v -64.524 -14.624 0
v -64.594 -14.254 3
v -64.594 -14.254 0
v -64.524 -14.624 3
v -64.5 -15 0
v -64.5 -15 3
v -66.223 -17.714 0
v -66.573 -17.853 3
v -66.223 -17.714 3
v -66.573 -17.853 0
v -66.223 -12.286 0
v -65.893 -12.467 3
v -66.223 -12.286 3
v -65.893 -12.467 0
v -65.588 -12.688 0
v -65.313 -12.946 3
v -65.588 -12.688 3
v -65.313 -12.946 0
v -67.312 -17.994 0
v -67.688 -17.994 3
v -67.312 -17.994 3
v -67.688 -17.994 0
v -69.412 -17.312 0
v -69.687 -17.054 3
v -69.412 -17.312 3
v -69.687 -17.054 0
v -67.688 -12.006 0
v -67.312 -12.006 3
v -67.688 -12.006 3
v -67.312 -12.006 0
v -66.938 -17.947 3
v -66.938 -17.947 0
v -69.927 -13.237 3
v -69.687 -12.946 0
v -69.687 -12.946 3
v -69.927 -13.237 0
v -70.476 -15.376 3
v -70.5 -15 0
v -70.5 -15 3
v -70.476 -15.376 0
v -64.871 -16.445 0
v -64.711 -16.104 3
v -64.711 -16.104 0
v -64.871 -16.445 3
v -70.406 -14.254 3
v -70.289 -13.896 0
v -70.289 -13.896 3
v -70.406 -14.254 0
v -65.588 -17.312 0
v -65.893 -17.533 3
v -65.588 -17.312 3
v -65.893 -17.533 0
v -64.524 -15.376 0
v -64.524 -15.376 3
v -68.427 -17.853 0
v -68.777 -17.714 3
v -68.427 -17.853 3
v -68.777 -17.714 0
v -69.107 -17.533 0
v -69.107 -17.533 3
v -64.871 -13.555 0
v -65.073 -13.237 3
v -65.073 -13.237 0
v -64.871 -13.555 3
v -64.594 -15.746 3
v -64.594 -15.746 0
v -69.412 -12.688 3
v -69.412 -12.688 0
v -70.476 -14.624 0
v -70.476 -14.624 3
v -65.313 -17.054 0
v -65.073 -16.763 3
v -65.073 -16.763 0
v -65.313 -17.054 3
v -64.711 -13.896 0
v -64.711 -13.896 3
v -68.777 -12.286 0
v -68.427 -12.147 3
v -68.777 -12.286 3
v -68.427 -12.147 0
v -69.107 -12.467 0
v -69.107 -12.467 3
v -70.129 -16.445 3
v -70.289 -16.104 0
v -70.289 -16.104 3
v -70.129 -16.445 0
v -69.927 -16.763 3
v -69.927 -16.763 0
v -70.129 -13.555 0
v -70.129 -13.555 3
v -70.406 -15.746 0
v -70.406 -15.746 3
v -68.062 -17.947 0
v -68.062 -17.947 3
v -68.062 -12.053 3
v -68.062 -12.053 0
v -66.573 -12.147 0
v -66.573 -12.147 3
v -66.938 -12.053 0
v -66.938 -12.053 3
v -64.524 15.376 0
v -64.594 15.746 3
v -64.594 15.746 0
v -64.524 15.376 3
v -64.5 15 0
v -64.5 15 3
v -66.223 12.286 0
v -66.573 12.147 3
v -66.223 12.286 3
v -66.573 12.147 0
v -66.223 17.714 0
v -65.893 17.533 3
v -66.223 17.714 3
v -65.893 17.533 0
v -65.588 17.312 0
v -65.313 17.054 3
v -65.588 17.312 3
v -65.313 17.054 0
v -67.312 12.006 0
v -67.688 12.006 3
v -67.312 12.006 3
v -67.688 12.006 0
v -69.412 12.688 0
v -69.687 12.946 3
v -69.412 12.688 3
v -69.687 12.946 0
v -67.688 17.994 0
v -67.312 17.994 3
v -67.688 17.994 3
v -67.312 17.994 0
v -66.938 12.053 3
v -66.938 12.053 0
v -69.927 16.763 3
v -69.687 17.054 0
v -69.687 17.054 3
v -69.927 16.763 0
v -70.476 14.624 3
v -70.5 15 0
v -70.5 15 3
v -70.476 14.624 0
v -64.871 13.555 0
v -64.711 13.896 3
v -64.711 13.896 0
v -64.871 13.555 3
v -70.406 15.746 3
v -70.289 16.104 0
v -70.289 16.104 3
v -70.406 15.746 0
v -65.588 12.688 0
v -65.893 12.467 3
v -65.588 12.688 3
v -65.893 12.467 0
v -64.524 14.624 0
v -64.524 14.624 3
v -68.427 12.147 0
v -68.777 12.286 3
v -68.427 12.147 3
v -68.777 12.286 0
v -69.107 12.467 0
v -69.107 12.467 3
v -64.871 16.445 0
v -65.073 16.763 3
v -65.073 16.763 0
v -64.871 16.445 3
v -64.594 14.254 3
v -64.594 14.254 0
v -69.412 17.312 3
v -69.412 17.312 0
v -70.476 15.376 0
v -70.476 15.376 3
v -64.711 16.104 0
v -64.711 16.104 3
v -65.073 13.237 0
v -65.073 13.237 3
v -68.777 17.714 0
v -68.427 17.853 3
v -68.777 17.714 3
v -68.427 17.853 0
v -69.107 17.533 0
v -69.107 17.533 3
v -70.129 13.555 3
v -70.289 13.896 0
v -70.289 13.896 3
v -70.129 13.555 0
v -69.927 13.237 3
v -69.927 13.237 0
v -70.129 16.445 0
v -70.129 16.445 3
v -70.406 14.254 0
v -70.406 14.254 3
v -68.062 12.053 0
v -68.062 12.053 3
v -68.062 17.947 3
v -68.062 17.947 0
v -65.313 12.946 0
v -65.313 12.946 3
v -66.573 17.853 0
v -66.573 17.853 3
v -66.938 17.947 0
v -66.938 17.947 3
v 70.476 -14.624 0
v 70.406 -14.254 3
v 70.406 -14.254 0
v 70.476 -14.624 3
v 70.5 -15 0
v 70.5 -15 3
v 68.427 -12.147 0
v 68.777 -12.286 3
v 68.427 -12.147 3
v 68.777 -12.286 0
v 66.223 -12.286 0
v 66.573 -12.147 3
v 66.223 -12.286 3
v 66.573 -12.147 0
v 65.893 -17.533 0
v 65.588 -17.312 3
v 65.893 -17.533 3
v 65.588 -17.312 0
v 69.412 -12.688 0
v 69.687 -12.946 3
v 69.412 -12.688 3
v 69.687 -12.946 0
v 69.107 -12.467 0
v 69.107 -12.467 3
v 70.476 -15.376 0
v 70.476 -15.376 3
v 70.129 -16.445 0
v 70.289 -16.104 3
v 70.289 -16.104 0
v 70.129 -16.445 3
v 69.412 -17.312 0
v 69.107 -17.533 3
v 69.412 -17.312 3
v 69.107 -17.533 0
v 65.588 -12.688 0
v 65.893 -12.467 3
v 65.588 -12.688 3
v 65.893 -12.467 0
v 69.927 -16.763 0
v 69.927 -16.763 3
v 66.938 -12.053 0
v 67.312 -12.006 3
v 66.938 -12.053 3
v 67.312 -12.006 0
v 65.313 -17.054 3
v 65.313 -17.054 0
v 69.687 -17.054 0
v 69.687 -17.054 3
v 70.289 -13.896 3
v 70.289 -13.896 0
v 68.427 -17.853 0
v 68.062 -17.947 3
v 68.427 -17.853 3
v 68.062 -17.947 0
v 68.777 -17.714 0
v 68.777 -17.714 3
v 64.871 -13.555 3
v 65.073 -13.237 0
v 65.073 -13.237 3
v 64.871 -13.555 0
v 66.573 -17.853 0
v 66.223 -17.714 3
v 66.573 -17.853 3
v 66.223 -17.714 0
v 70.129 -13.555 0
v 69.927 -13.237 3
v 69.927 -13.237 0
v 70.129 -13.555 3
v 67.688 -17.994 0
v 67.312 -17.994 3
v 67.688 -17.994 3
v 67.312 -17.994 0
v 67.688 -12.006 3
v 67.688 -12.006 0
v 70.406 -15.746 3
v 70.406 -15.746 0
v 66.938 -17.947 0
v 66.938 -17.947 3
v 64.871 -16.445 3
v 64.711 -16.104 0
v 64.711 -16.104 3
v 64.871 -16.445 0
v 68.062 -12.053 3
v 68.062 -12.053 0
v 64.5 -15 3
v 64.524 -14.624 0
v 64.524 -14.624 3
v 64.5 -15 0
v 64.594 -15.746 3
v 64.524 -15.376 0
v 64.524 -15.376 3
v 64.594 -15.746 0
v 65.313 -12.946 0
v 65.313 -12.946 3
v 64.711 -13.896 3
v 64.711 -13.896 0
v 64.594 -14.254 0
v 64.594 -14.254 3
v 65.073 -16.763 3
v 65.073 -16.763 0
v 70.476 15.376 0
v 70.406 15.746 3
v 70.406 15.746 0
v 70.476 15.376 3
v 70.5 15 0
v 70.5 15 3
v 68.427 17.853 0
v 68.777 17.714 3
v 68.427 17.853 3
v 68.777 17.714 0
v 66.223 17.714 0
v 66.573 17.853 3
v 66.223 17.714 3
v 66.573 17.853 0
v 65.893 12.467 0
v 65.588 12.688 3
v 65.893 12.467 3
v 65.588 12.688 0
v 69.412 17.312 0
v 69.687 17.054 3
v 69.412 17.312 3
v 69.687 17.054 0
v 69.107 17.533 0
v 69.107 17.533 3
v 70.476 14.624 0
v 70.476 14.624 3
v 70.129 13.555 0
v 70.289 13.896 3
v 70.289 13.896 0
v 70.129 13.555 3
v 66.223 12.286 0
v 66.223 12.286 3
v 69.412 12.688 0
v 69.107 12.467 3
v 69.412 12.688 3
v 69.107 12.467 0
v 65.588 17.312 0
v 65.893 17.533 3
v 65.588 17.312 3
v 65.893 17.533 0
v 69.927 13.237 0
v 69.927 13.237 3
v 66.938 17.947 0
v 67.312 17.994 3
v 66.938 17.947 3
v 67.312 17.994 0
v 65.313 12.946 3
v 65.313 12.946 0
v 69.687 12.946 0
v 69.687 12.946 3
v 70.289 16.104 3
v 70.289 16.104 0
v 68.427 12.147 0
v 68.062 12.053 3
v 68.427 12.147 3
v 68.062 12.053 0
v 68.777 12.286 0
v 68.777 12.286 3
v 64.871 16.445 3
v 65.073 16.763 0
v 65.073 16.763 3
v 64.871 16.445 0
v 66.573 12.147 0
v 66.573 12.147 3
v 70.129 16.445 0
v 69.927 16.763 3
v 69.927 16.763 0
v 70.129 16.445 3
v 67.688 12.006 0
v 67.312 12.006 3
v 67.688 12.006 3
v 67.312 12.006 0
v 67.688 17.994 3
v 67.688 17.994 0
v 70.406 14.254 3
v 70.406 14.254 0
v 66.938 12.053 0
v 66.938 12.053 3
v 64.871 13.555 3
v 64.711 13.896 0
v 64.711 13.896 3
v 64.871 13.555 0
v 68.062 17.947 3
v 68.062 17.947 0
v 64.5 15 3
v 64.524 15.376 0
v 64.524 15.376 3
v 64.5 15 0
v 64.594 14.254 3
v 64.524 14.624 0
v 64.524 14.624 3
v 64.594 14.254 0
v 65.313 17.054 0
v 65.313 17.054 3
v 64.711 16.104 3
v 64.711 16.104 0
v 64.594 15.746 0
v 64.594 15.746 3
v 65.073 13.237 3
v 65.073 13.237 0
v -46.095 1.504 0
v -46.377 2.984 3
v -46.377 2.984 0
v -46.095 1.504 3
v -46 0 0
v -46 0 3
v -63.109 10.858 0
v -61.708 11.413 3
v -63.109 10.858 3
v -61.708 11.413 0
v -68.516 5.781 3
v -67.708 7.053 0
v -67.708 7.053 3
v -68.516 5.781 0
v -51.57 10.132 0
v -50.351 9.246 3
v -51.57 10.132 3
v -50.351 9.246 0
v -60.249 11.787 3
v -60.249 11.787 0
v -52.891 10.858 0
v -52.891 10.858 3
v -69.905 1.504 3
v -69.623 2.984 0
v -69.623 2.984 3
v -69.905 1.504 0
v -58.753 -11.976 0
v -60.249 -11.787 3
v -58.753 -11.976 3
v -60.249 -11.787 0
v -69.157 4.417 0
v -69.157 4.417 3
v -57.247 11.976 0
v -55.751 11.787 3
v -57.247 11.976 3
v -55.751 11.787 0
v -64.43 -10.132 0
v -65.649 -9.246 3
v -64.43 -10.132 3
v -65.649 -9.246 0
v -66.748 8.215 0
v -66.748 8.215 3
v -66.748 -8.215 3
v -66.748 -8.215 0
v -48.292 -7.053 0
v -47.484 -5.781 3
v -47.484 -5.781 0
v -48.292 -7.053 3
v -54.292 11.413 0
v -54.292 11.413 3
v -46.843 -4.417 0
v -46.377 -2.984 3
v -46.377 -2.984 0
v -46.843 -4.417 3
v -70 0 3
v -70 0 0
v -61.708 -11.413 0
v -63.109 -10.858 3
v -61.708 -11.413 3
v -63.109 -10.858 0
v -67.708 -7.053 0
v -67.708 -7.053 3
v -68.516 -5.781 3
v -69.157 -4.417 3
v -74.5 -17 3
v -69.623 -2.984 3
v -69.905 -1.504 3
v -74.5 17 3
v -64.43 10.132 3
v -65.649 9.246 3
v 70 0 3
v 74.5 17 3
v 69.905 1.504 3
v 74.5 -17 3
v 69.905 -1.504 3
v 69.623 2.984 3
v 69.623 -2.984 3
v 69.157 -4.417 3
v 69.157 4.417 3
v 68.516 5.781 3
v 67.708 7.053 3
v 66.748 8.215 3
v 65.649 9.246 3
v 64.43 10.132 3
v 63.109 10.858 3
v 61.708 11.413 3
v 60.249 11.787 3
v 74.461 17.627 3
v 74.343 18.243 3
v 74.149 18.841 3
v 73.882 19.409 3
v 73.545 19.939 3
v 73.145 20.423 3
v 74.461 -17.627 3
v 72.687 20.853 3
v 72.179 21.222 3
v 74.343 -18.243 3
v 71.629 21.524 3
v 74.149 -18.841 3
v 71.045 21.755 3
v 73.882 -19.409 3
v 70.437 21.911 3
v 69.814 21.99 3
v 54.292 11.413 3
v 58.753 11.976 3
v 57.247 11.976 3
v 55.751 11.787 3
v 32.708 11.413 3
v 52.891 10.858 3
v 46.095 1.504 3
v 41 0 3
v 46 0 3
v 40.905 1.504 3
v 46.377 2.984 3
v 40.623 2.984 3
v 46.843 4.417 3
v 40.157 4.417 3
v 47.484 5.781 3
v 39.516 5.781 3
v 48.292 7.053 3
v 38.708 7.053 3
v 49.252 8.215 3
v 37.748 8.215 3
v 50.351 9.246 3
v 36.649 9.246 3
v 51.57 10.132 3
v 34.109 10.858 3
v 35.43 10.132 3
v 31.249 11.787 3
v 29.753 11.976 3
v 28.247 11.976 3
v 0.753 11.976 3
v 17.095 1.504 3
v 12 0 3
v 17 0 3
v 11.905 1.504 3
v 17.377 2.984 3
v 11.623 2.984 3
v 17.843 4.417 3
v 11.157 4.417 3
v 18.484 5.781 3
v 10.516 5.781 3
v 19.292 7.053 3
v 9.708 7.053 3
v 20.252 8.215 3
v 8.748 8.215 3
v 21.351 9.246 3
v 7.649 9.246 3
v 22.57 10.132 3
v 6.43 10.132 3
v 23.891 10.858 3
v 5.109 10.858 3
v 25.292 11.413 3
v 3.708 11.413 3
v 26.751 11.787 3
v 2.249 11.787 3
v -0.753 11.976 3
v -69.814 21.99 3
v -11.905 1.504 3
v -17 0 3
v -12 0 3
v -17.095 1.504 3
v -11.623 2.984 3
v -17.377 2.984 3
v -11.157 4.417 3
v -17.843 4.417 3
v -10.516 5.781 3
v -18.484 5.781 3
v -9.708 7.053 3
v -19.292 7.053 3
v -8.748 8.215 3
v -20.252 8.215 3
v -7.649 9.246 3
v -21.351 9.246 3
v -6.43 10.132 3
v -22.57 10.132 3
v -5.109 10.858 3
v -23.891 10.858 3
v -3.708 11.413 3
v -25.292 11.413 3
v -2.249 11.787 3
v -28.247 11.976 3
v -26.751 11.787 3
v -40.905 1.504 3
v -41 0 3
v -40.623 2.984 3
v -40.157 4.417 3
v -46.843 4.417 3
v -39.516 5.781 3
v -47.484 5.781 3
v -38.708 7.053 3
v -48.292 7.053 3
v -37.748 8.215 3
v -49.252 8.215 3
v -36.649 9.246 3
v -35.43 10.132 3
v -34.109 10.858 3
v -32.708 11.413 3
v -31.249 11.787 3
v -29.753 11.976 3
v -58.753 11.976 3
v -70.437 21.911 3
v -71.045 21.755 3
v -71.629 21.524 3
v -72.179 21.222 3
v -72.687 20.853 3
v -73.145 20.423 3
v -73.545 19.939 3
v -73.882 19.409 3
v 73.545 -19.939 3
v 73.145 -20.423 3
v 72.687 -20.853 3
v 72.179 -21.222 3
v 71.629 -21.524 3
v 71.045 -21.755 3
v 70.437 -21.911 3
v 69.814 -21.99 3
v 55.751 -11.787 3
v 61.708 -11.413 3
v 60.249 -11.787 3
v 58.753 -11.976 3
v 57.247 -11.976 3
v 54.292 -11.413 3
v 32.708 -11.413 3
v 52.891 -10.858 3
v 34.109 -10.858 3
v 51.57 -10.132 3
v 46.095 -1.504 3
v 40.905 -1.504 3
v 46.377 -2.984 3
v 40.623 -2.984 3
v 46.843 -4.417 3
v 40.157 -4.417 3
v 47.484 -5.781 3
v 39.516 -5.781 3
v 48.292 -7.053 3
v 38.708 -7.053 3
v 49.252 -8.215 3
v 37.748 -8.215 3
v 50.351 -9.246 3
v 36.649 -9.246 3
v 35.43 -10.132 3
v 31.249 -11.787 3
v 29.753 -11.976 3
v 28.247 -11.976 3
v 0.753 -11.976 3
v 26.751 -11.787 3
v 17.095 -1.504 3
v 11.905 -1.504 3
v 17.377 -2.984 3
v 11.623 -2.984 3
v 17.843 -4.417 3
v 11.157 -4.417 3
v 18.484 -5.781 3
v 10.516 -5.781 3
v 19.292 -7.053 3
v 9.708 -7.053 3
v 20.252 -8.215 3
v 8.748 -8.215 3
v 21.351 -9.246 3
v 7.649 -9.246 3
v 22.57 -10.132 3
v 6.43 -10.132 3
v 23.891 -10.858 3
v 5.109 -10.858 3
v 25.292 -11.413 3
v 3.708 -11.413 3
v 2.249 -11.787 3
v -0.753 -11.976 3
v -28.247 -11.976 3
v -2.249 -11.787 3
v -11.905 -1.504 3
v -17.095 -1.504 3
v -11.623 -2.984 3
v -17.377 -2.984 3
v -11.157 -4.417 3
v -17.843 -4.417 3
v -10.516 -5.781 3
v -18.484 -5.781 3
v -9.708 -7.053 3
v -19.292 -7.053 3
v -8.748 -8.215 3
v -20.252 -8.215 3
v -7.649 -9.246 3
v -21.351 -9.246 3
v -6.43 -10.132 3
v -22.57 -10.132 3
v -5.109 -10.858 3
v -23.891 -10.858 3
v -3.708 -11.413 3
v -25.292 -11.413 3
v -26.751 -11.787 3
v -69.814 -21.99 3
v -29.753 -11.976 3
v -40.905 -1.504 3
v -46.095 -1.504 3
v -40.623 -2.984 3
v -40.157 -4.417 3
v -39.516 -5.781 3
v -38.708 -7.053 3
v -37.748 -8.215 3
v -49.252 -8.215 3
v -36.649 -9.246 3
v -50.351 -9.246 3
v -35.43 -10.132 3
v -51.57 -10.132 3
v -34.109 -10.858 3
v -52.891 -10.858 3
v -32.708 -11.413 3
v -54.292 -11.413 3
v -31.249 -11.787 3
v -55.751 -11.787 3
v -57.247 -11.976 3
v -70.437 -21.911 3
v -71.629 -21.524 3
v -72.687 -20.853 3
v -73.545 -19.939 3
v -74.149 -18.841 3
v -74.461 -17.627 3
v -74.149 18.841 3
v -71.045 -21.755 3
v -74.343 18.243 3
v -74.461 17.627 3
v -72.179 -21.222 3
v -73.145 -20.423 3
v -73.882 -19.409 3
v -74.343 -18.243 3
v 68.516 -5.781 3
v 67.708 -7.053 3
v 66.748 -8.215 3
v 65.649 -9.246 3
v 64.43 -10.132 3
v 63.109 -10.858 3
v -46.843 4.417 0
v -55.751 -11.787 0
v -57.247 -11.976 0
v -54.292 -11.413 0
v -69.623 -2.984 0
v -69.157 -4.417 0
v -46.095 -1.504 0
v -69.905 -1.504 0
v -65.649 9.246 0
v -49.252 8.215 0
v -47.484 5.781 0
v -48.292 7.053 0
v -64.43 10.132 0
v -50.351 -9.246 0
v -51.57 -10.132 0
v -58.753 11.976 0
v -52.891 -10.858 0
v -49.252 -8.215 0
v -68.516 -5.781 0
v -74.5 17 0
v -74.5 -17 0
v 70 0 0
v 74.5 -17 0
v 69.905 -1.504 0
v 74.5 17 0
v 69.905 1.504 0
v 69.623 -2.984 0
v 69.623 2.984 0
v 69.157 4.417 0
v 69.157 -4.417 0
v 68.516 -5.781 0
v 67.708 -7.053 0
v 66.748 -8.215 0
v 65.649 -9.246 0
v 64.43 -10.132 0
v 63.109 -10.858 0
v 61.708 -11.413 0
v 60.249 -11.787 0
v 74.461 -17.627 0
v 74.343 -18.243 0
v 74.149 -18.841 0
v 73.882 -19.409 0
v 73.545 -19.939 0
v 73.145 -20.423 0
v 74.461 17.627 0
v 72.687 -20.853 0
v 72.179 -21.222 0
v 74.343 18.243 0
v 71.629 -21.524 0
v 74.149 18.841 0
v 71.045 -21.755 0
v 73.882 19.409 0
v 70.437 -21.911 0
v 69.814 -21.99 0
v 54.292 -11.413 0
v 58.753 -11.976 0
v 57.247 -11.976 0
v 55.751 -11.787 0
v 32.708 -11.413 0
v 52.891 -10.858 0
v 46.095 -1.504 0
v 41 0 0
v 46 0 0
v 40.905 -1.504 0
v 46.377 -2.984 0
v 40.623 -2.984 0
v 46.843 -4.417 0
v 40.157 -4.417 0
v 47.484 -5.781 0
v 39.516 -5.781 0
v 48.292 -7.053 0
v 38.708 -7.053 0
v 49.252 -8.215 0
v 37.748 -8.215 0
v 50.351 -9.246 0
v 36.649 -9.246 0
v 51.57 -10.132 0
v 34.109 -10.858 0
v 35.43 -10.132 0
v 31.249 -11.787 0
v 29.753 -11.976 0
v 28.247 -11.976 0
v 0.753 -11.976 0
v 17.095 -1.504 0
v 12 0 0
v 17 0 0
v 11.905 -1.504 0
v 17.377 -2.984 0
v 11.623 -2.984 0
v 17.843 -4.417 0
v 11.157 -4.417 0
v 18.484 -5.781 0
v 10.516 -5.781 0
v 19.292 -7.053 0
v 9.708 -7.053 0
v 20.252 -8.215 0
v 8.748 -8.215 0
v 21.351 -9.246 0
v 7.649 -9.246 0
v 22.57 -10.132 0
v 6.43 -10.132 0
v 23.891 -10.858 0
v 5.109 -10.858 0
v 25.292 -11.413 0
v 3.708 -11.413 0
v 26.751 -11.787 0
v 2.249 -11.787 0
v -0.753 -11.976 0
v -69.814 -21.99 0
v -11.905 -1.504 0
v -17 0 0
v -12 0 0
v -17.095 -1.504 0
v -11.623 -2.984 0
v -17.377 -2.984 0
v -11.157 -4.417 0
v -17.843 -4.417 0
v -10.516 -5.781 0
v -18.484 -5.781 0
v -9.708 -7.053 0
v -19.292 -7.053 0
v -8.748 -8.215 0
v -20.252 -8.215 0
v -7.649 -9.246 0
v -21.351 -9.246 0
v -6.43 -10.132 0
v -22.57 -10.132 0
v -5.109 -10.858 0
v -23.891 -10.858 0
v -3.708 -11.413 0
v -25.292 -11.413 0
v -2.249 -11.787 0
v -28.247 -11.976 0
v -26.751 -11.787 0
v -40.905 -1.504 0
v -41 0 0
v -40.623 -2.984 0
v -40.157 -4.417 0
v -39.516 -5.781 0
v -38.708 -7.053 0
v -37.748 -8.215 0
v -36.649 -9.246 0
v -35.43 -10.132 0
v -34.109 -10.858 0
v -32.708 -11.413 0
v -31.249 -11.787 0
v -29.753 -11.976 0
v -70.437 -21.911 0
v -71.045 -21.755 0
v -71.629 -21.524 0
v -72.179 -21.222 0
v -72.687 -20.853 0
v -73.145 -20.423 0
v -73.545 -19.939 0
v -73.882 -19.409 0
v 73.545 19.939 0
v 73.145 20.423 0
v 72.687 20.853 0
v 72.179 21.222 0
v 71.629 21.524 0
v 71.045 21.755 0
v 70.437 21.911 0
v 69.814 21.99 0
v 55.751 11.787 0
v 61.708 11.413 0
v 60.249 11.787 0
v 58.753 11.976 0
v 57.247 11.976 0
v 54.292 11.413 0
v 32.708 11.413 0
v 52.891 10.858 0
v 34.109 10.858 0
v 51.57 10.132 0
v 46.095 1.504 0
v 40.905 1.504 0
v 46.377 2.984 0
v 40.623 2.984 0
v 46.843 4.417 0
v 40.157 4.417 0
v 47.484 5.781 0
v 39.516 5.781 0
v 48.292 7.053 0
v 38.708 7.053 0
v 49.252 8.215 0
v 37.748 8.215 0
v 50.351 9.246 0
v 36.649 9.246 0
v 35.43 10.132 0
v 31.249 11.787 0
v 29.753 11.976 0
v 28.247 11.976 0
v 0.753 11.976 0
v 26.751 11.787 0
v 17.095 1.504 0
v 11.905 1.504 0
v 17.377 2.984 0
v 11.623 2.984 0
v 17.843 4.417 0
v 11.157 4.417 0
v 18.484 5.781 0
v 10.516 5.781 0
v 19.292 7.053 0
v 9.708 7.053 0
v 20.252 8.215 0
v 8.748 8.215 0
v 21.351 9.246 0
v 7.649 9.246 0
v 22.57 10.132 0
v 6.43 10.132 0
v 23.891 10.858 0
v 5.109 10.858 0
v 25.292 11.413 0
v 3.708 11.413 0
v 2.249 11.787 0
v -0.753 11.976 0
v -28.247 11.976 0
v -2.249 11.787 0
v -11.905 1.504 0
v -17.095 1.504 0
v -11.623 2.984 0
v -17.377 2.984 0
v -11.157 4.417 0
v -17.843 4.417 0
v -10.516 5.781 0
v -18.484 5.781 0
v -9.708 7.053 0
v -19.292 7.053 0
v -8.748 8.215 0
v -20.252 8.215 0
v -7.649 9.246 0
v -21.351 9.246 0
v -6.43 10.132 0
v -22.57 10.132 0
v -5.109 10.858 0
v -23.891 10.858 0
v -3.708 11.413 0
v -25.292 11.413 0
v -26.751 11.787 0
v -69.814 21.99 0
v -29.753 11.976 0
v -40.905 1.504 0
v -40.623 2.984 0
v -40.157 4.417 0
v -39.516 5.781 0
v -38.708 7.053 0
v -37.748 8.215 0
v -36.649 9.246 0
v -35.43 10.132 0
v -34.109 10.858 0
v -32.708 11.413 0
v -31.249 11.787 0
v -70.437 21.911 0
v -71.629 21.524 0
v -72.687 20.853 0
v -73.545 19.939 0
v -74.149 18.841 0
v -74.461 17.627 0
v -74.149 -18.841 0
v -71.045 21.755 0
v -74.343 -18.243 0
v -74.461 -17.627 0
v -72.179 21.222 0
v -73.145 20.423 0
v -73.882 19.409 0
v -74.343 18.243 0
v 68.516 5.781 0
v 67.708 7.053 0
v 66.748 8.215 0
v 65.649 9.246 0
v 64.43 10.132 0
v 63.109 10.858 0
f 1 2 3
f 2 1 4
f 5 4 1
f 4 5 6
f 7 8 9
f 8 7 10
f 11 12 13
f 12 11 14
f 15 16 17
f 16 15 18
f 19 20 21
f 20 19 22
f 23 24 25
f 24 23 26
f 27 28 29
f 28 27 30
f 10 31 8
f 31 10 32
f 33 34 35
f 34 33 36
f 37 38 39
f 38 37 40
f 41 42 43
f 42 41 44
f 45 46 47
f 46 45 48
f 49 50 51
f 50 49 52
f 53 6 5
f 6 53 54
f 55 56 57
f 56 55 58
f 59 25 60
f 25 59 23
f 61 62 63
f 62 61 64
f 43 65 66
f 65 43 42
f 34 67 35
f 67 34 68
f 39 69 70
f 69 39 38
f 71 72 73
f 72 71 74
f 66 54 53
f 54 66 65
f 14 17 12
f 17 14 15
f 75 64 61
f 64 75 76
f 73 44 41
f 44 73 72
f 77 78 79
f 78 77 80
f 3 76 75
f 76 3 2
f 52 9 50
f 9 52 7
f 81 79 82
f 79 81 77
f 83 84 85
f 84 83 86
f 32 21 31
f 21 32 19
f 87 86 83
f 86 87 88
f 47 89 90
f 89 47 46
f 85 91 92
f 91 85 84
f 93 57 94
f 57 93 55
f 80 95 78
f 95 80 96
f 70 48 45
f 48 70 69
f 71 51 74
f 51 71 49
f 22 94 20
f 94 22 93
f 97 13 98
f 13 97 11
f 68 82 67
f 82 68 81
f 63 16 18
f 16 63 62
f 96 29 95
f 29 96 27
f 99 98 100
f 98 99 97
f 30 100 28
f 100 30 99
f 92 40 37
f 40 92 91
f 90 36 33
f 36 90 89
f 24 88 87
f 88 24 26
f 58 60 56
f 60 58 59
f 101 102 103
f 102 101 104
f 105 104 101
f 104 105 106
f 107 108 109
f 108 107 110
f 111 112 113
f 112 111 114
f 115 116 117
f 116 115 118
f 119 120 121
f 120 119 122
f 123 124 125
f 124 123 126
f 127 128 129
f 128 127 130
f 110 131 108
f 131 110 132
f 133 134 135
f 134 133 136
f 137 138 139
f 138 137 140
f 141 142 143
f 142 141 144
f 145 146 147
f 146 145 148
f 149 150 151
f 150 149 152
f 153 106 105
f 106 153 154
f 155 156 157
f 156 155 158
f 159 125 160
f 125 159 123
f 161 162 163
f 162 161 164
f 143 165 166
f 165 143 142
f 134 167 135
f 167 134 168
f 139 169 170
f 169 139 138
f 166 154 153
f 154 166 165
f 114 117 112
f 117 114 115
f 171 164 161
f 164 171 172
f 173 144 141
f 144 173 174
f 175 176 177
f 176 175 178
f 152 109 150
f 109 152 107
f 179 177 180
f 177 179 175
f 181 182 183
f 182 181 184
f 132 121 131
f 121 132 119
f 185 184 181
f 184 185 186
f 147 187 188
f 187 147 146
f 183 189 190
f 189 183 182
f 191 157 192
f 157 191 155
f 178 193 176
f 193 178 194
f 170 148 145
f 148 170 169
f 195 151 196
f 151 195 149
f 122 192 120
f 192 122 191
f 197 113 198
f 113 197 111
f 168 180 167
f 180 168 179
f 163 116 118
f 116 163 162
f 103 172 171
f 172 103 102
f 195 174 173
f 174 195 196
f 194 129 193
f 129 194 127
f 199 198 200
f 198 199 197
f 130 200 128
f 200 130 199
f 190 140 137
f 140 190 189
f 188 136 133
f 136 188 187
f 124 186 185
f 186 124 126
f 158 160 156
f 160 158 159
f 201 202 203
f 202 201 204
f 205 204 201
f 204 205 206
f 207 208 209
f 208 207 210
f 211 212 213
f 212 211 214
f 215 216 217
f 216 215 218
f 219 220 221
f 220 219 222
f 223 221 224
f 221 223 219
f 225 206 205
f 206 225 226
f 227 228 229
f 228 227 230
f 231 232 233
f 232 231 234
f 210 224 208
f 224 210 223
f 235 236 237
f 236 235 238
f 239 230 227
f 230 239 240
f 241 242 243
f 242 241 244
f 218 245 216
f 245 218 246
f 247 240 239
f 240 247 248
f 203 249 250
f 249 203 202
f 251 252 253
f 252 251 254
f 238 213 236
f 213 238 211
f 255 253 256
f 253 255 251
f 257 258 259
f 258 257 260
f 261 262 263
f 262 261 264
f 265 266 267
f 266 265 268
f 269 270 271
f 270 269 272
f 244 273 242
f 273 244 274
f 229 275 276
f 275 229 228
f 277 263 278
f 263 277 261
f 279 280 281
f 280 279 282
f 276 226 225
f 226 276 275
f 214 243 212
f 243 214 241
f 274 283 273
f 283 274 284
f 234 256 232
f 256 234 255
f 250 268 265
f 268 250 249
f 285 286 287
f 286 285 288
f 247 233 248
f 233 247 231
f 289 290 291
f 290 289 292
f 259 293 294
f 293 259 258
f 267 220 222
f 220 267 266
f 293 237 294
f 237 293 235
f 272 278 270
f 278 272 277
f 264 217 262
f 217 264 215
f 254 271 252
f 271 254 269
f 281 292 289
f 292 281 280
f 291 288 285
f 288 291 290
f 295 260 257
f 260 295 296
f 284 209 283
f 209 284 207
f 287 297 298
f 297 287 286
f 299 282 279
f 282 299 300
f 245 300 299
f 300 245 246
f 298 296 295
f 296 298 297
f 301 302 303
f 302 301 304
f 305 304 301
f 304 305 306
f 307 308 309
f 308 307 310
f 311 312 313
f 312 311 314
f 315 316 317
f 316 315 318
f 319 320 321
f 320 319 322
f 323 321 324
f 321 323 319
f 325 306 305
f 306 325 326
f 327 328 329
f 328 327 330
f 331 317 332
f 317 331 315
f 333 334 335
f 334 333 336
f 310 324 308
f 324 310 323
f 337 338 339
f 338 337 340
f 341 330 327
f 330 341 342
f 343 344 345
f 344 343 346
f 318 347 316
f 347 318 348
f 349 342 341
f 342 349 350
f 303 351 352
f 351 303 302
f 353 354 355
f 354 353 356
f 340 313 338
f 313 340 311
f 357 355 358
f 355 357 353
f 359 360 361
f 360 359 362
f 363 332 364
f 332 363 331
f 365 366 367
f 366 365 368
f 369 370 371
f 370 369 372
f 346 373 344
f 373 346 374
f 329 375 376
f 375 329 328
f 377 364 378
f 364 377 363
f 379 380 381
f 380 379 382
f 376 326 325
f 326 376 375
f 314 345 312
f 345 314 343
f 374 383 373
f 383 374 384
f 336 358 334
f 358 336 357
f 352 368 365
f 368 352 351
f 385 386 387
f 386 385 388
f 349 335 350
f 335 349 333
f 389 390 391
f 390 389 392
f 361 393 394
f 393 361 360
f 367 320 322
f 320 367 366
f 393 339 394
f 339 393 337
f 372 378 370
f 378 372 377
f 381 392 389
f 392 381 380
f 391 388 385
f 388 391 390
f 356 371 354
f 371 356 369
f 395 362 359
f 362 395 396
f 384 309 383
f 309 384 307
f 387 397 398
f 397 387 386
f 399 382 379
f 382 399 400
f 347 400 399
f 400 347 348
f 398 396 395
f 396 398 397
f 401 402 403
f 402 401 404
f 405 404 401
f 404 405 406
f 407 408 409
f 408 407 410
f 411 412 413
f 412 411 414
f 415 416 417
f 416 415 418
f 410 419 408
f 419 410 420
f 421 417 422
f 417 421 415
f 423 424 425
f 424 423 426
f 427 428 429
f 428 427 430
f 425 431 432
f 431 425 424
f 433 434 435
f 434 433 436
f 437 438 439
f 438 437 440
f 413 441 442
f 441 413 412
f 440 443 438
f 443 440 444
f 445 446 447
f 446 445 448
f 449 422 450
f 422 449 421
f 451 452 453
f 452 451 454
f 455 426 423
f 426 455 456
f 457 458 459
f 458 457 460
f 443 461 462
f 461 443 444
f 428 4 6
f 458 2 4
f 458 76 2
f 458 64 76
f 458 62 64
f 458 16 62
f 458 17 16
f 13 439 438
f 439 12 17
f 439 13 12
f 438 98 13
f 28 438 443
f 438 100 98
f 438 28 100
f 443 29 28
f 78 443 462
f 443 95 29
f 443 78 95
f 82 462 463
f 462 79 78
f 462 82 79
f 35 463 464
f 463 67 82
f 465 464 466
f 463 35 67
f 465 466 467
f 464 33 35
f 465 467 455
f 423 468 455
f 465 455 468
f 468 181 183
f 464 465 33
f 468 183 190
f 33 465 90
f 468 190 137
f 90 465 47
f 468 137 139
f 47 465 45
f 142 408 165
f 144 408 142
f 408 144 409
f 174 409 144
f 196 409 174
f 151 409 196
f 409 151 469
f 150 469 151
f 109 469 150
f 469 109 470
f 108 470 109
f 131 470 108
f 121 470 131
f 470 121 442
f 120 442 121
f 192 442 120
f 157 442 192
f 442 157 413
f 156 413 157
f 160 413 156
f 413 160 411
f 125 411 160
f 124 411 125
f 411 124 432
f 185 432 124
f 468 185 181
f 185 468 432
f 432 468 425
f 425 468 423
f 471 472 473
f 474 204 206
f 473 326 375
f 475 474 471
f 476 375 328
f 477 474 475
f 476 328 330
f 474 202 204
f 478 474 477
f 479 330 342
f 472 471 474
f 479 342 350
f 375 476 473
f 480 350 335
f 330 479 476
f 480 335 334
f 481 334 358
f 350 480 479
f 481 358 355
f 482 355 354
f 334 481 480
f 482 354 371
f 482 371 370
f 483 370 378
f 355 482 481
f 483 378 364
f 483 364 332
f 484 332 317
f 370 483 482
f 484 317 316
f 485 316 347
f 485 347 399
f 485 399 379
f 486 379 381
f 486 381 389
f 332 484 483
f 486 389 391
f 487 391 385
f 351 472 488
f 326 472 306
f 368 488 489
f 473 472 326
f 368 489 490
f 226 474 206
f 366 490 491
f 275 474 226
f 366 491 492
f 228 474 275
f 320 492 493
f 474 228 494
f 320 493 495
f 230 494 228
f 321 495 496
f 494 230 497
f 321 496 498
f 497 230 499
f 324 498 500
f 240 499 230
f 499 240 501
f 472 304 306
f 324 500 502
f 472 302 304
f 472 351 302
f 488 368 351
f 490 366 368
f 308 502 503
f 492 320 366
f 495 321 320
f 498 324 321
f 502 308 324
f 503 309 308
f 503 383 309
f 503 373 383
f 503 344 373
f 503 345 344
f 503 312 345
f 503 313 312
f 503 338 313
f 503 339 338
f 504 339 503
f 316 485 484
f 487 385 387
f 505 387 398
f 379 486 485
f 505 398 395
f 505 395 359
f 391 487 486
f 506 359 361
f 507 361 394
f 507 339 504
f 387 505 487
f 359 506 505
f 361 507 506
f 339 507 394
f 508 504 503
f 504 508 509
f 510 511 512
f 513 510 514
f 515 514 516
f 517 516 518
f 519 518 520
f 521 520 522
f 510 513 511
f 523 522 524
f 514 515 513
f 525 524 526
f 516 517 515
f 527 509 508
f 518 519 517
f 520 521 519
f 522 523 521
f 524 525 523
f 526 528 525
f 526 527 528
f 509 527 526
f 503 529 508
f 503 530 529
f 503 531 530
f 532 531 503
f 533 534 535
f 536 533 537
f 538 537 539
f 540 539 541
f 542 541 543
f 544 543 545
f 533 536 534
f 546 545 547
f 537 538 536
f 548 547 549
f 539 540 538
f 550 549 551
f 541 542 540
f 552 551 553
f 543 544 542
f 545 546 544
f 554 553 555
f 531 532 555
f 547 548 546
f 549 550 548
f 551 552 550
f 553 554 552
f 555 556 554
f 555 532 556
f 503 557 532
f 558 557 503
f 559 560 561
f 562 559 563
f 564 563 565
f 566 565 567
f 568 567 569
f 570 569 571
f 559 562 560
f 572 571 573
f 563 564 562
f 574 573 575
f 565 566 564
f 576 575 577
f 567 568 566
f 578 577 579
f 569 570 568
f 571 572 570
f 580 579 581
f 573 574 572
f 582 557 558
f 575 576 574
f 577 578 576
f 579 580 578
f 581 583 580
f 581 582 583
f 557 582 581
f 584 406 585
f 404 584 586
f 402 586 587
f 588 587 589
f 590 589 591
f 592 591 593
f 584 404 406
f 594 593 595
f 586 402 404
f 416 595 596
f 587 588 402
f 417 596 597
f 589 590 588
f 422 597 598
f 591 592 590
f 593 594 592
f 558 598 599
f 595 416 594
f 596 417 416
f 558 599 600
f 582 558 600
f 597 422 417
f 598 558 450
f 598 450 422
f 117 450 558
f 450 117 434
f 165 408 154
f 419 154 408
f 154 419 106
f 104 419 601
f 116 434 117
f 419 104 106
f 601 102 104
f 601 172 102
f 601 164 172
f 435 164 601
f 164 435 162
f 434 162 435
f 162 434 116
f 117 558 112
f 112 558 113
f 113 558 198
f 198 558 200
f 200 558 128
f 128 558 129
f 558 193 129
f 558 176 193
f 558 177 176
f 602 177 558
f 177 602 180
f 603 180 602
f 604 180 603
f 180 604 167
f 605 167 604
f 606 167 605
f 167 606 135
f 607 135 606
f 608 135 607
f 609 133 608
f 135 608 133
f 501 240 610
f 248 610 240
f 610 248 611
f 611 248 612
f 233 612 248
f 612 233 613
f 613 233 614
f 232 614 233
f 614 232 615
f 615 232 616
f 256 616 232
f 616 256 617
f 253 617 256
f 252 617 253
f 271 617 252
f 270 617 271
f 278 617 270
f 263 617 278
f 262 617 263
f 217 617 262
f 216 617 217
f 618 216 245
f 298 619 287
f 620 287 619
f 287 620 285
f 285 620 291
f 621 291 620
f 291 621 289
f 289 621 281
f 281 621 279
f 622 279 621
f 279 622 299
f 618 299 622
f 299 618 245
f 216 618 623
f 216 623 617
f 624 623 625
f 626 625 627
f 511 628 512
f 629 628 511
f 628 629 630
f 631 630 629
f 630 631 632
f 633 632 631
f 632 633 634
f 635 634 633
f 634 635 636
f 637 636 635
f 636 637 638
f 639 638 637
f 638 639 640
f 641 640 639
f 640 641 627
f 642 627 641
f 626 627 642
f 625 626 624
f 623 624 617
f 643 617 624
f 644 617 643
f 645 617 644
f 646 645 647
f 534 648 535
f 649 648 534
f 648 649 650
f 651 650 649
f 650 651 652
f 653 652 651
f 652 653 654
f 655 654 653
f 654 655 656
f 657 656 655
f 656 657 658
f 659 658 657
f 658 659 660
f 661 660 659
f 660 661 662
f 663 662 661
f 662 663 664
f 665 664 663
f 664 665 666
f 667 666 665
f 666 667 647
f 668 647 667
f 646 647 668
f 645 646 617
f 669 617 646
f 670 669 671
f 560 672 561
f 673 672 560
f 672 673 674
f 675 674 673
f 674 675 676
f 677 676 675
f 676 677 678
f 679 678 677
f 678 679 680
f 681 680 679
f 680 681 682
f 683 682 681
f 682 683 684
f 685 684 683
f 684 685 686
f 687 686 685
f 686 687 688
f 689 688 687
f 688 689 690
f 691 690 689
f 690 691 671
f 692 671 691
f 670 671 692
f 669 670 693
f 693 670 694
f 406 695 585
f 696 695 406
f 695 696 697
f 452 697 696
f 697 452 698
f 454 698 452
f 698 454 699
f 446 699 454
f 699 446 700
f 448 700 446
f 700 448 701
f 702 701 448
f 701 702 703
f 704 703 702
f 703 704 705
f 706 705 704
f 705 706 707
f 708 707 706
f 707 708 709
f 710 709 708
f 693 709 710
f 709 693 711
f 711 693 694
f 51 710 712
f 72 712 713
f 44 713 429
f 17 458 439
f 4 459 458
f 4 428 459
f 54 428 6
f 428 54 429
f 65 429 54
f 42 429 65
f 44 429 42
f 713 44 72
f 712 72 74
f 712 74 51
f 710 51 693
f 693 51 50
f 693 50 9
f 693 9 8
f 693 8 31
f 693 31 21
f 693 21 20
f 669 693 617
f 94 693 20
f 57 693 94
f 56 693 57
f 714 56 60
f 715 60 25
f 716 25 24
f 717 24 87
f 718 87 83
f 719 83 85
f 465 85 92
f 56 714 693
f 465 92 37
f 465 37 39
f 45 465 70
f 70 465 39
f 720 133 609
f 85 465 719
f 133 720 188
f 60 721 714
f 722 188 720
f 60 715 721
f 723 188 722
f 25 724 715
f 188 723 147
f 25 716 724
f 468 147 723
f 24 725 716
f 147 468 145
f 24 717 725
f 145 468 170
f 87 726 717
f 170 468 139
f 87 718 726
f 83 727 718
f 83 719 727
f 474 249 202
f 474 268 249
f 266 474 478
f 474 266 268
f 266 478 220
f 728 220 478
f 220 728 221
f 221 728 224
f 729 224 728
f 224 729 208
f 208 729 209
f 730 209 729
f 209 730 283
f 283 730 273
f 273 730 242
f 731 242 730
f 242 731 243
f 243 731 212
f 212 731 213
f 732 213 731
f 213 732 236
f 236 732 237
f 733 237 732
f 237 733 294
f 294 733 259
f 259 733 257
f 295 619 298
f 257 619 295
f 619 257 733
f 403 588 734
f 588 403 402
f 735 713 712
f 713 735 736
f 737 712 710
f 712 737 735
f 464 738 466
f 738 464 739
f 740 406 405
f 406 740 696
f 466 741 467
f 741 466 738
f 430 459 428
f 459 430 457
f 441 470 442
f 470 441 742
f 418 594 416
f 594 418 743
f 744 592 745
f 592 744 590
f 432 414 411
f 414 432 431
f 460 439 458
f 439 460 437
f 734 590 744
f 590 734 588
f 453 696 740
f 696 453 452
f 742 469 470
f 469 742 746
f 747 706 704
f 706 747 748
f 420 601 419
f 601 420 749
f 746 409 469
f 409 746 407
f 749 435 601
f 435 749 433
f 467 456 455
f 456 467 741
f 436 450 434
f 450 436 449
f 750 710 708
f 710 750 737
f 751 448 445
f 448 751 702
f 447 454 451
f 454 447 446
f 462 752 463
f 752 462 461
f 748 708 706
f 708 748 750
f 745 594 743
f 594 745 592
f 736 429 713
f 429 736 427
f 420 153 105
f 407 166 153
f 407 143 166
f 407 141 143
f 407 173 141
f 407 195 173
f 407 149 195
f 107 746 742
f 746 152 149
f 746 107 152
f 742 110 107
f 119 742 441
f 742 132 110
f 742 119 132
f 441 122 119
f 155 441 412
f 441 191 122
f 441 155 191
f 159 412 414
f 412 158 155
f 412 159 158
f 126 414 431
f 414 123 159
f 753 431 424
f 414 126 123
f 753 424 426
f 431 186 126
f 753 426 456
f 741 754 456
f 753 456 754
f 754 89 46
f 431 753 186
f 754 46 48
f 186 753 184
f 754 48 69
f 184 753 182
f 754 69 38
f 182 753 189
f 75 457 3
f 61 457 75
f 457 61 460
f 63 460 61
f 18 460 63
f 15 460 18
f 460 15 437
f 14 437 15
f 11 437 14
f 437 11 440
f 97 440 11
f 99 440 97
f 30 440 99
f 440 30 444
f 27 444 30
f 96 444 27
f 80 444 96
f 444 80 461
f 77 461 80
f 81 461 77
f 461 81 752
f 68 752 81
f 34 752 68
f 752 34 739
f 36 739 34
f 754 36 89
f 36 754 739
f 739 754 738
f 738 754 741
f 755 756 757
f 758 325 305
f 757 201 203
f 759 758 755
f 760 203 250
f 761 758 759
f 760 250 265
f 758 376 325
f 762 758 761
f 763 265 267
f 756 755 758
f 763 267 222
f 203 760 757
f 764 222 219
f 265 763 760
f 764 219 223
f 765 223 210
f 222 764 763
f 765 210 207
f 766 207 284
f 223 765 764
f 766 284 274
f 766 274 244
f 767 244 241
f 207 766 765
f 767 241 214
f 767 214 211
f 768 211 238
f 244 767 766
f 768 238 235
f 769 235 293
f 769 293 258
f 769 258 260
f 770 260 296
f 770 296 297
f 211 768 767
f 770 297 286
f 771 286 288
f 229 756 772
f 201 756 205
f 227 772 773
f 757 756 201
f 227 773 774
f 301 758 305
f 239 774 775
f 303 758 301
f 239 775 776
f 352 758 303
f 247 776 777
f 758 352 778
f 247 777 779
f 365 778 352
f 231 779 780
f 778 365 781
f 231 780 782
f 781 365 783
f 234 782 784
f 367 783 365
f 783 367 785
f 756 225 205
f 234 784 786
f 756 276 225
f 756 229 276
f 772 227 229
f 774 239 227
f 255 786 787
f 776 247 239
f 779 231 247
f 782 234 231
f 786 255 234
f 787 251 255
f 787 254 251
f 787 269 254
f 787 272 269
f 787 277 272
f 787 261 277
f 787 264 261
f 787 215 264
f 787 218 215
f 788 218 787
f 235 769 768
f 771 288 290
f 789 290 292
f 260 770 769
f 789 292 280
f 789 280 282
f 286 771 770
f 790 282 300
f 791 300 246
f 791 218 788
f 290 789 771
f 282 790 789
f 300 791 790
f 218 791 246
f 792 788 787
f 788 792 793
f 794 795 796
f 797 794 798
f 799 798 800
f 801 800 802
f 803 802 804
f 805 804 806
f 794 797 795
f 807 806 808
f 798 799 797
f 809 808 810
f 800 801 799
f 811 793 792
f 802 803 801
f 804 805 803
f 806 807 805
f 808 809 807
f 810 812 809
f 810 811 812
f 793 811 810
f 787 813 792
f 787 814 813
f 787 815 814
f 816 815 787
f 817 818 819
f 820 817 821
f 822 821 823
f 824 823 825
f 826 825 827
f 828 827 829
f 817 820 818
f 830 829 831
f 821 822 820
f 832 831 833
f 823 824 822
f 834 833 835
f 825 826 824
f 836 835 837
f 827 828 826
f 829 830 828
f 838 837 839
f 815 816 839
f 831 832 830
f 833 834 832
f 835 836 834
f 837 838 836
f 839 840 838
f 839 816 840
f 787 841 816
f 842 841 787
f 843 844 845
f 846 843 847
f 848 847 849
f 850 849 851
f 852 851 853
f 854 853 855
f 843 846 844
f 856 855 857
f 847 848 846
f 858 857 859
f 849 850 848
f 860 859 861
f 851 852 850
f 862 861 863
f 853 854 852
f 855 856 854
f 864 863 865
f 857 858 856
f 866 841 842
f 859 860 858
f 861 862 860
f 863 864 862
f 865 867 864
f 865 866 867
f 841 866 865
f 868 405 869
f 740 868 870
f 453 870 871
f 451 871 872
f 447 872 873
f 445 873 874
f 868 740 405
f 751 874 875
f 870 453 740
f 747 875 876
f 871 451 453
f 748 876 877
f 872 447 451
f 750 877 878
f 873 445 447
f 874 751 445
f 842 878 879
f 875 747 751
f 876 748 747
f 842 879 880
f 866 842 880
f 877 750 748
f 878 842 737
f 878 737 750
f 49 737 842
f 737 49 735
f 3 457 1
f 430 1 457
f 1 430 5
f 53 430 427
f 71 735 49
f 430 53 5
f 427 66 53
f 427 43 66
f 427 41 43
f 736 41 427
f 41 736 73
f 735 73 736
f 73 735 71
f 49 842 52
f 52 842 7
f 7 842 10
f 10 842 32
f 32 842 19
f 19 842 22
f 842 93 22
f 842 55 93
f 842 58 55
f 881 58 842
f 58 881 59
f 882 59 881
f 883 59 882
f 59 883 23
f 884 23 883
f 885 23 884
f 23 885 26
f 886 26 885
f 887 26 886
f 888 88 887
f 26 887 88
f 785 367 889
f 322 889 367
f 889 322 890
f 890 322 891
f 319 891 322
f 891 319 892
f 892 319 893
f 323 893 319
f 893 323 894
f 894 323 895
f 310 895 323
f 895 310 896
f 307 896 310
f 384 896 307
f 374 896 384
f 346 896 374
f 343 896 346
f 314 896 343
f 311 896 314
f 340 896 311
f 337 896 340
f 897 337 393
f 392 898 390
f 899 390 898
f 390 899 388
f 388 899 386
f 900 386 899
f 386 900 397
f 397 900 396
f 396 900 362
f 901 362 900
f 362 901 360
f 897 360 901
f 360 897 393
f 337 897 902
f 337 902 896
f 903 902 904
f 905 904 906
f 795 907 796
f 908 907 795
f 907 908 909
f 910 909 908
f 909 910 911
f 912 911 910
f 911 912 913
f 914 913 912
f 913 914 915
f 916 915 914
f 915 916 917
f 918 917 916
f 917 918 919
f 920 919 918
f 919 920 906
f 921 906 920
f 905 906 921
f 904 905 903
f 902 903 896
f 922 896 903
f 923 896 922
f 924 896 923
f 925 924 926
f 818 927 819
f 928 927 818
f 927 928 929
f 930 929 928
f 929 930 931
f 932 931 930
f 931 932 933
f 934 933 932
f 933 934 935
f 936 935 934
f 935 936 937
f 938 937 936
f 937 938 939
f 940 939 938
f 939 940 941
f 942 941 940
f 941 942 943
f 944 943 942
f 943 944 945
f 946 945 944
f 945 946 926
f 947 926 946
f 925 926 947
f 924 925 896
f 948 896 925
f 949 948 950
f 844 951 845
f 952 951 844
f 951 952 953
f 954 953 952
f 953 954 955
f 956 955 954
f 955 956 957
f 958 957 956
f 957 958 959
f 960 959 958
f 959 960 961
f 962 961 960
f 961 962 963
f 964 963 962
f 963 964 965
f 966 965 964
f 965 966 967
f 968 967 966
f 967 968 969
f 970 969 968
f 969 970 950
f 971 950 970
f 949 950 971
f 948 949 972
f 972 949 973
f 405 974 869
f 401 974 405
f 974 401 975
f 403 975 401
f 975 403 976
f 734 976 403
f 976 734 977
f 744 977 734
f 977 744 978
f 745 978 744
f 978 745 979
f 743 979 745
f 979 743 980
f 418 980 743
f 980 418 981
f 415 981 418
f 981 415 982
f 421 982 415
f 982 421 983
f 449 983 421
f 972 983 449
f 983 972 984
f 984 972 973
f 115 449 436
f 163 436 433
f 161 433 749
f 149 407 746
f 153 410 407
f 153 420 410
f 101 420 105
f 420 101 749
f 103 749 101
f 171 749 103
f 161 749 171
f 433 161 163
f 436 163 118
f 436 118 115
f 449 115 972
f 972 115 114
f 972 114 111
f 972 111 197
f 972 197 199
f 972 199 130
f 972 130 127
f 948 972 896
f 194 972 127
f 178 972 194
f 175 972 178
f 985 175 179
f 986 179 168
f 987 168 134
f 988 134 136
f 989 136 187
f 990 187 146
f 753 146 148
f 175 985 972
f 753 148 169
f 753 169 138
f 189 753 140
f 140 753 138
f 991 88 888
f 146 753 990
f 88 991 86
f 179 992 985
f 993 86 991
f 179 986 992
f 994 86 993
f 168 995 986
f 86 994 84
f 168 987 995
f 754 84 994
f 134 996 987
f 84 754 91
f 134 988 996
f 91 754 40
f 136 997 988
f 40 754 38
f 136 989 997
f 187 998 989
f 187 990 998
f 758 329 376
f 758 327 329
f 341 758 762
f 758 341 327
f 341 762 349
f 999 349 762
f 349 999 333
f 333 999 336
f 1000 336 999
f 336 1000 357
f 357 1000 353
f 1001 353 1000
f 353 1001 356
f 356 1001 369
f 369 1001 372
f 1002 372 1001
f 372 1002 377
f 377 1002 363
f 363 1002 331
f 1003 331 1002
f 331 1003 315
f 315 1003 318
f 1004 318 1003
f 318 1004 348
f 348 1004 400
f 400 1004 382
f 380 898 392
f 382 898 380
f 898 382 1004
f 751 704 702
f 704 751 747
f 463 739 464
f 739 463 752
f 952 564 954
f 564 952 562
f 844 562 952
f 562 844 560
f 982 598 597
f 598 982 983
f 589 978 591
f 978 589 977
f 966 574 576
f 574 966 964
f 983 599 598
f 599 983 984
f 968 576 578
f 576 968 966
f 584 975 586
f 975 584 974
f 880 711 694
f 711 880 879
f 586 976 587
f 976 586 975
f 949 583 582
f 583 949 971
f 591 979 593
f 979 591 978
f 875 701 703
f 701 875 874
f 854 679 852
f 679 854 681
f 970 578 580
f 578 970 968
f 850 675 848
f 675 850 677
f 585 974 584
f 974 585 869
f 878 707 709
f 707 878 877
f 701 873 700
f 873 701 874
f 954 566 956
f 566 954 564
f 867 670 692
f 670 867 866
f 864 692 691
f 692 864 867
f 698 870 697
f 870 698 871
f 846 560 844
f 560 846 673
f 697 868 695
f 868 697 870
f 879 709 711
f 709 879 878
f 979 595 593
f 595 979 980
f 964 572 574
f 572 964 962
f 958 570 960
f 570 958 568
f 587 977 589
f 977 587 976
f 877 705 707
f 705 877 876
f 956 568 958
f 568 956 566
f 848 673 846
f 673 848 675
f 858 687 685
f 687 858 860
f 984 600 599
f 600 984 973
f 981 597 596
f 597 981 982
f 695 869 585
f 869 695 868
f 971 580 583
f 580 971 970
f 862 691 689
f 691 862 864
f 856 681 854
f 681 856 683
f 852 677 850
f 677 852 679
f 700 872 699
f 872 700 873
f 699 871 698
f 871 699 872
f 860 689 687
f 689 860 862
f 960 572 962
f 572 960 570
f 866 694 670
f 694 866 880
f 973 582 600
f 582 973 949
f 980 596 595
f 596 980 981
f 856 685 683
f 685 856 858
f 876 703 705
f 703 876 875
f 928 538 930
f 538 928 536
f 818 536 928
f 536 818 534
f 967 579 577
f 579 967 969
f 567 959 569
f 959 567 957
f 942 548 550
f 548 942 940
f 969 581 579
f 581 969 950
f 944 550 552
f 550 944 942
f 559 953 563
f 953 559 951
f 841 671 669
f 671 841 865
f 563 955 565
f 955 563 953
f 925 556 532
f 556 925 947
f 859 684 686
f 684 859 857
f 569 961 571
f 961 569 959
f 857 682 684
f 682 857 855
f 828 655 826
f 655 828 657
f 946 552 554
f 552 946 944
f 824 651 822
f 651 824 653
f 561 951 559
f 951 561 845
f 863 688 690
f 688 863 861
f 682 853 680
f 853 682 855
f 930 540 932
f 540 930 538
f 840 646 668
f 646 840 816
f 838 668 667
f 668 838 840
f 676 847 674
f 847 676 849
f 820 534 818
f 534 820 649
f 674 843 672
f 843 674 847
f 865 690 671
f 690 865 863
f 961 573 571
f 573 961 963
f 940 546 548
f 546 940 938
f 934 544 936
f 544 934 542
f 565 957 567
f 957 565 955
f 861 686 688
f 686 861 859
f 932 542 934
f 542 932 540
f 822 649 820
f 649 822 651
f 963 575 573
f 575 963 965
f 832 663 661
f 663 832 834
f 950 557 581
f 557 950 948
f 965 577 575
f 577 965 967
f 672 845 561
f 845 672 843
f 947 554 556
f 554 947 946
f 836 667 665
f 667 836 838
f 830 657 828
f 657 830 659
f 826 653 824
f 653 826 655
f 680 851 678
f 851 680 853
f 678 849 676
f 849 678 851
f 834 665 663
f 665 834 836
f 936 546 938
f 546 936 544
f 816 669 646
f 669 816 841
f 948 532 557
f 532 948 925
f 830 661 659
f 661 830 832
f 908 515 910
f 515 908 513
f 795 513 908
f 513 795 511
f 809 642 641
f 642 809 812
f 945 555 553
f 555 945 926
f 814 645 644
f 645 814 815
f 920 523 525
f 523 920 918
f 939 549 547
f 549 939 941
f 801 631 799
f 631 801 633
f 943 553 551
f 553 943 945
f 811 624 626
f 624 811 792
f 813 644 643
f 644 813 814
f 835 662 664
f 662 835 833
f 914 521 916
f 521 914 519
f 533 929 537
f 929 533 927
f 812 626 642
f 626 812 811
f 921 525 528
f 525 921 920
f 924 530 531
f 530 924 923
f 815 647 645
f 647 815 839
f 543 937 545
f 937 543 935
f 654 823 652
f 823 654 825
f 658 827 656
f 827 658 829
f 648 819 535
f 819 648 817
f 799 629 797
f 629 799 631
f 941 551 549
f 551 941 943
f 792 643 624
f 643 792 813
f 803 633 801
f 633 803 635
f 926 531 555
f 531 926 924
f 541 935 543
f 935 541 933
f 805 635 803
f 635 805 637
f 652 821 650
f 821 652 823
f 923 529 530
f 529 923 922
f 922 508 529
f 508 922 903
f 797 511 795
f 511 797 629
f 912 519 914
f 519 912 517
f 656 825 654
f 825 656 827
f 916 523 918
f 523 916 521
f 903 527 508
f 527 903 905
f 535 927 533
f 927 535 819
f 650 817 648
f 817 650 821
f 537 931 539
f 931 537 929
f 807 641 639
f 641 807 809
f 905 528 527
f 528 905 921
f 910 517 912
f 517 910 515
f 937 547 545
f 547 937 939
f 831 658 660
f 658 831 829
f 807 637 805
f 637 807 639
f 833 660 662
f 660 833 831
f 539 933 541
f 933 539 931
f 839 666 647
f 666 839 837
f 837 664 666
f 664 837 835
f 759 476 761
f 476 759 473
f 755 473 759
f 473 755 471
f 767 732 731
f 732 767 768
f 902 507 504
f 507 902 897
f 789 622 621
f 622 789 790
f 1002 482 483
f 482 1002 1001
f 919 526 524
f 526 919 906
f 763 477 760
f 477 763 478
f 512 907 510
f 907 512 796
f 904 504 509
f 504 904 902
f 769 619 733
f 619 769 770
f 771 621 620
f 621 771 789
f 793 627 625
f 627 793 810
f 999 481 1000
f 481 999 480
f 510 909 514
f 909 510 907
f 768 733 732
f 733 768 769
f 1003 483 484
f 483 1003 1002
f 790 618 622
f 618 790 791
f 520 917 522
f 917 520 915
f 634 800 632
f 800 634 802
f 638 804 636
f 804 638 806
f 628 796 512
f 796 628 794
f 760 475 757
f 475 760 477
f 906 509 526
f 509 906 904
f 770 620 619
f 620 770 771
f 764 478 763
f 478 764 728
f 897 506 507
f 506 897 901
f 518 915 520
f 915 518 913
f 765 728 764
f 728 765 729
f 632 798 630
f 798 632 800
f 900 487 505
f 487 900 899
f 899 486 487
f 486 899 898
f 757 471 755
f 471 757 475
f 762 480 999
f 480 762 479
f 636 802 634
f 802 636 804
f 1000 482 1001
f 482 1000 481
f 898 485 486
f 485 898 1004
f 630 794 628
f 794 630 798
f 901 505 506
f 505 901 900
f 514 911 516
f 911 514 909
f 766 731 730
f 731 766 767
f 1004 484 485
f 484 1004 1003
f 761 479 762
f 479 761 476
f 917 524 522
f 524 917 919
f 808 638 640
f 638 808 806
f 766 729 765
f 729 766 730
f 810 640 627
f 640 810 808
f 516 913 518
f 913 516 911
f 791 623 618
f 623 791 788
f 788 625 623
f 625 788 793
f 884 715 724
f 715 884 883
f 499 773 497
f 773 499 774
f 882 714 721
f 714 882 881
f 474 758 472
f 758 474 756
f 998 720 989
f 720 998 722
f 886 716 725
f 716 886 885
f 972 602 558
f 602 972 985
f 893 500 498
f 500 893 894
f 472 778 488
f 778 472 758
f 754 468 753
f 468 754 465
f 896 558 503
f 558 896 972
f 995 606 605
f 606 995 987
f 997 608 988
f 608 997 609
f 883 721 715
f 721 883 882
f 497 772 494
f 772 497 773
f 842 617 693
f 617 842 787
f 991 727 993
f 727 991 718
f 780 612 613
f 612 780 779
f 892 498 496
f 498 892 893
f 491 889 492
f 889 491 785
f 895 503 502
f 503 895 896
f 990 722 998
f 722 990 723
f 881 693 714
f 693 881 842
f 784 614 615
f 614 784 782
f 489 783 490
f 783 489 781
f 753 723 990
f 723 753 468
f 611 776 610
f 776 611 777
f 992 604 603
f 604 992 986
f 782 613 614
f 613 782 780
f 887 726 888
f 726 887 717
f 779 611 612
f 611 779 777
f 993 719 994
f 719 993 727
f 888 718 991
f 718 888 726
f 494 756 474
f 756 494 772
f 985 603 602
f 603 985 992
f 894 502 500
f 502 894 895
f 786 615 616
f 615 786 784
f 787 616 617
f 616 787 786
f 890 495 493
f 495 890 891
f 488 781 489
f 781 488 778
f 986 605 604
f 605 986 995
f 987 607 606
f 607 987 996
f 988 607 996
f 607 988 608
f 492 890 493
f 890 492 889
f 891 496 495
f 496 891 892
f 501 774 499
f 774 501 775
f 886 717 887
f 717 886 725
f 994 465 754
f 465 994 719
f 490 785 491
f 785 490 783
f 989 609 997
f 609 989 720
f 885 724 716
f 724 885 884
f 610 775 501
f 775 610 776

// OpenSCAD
$fn = 50;


difference() {
	union() {
		hull() {
			translate(v = [-69.5000000000, 17.0000000000, 0]) {
				cylinder(h = 3, r = 5);
			}
			translate(v = [69.5000000000, 17.0000000000, 0]) {
				cylinder(h = 3, r = 5);
			}
			translate(v = [-69.5000000000, -17.0000000000, 0]) {
				cylinder(h = 3, r = 5);
			}
			translate(v = [69.5000000000, -17.0000000000, 0]) {
				cylinder(h = 3, r = 5);
			}
		}
	}
	union() {
		#translate(v = [-67.5000000000, -15.0000000000, -100.0000000000]) {
			cylinder(h = 200, r = 3.0000000000);
		}
		#translate(v = [-67.5000000000, 15.0000000000, -100.0000000000]) {
			cylinder(h = 200, r = 3.0000000000);
		}
		#translate(v = [67.5000000000, -15.0000000000, -100.0000000000]) {
			cylinder(h = 200, r = 3.0000000000);
		}
		#translate(v = [67.5000000000, 15.0000000000, -100.0000000000]) {
			cylinder(h = 200, r = 3.0000000000);
		}
		#translate(v = [-58.0000000000, 0, 0]) {
			cylinder(h = 3, r = 12.0000000000);
		}
		#translate(v = [-29.0000000000, 0, 0]) {
			cylinder(h = 3, r = 12.0000000000);
		}
		#cylinder(h = 3, r = 12.0000000000);
		#translate(v = [29.0000000000, 0, 0]) {
			cylinder(h = 3, r = 12.0000000000);
		}
		#translate(v = [58.0000000000, 0, 0]) {
			cylinder(h = 3, r = 12.0000000000);
		}
	}
}
